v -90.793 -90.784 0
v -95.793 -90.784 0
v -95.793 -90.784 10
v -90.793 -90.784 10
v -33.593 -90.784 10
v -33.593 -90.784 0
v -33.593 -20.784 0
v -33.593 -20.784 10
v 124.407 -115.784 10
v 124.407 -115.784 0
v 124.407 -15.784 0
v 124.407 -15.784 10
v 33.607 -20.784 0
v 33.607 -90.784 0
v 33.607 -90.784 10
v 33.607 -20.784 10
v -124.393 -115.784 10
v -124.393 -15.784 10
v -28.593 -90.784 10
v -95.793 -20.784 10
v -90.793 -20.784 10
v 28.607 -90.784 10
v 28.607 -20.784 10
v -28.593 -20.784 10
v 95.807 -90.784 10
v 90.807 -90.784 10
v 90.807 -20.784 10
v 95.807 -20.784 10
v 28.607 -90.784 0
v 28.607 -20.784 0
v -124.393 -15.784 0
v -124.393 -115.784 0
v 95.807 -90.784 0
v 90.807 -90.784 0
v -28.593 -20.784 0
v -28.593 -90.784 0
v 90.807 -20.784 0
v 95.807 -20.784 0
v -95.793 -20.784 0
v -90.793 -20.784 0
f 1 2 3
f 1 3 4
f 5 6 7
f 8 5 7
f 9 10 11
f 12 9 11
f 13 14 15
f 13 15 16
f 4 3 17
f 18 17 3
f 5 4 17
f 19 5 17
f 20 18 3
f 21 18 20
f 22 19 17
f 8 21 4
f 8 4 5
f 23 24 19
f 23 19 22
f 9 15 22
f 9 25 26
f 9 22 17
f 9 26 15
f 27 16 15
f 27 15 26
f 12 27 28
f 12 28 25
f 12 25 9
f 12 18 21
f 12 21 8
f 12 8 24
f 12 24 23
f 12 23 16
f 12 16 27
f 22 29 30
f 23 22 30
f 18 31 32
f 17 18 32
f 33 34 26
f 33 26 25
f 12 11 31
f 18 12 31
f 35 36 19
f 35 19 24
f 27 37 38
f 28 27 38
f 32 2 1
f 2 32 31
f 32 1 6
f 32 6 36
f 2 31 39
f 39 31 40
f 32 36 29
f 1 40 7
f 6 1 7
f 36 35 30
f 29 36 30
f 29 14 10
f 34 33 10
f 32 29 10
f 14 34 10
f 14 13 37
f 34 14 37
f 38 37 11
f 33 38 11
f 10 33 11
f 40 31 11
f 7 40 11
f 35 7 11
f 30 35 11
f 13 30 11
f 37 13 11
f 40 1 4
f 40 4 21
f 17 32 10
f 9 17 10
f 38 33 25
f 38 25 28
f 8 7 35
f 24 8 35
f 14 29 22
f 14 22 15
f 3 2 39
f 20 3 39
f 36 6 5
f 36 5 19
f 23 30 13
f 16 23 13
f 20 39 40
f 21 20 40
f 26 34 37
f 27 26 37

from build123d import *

# Parameters (mm, degrees)
SKETCH1_W           = 5
SKETCH1_H           = 70
BOSS_EXTRUDE1_DEPTH = 10


with BuildPart() as part:
    # Sketch1 → Boss-Extrude1 (new body)
    with BuildSketch(Plane.XY):
        Polygon((-124.392981478, -115.783921891), (0, -115.783921891), (124.407018522, -115.783921891), (124.407018522, -15.783921891), (-0.05047515, -15.783921891), (-124.392981478, -15.783921891), align=None)
        with Locations((-31.092981478, -55.783921891)):
            Rectangle(SKETCH1_W, SKETCH1_H, mode=Mode.SUBTRACT)
        with Locations((-93.292981478, -55.783921891)):
            Rectangle(SKETCH1_W, SKETCH1_H, mode=Mode.SUBTRACT)
        with Locations((31.107018522, -55.783921891)):
            Rectangle(SKETCH1_W, SKETCH1_H, mode=Mode.SUBTRACT)
        with Locations((93.307018522, -55.783921891)):
            Rectangle(SKETCH1_W, SKETCH1_H, mode=Mode.SUBTRACT)
    extrude(amount=BOSS_EXTRUDE1_DEPTH)


solid = part.part
